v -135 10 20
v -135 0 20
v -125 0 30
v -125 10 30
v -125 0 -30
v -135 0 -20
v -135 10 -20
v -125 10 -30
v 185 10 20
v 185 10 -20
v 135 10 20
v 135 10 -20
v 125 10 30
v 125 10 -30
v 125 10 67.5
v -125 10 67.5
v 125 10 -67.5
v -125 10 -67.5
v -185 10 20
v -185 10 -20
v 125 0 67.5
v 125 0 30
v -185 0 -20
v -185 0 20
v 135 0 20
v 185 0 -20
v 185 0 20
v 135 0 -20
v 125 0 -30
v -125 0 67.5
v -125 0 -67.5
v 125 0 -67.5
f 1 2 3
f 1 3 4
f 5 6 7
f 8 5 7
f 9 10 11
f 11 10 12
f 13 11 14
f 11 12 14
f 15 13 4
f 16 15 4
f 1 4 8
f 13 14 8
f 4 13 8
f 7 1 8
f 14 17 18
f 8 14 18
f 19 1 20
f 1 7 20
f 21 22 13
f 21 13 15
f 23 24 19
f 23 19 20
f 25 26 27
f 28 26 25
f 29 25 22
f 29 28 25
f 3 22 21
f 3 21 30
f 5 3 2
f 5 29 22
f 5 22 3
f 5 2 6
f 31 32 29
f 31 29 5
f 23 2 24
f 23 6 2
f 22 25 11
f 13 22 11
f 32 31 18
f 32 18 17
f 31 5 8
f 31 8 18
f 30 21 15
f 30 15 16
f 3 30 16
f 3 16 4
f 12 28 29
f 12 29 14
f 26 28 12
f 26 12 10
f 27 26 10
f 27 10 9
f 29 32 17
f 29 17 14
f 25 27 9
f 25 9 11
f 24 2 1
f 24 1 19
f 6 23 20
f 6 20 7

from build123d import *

# Parameters (mm, degrees)
BOSS_EXTRUDE1_DEPTH = 10
CHAMFER1_SIZE       = 10


with BuildPart() as part:
    # Sketch1 → Boss-Extrude1 (new body)
    with BuildSketch(Plane(origin=(0, 0, 0), x_dir=(1, 0, 0), z_dir=(0, 1, 0))):
        Polygon((125, -20), (125, -67.5), (-125, -67.5), (-125, -20), (-185, -20), (-185, 20), (-125, 20), (-125, 67.5), (125, 67.5), (125, 20), (185, 20), (185, -20), align=None)
    extrude(amount=BOSS_EXTRUDE1_DEPTH)

    # Chamfer1
    chamfer1_edges = [part.edges().sort_by_distance(p)[0] for p in [
        (-125, 5, 20),
        (-125, 5, -20),
        (125, 5, -20),
        (125, 5, 20),
    ]]
    chamfer(chamfer1_edges, length=CHAMFER1_SIZE)


solid = part.part
